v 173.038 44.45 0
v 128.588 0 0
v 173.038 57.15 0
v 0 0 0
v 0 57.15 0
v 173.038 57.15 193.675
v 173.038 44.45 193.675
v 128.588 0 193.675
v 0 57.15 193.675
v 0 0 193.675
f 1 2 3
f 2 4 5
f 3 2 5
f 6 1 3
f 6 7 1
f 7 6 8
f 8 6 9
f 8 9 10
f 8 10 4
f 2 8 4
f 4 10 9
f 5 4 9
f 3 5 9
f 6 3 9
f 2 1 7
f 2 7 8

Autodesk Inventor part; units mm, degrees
ref_plane "YZ Plane" through (0, 0, 0) normal (1, 0, 0) x (0, 1, 0)
ref_plane "XZ Plane" through (0, 0, 0) normal (0, 1, 0) x (-1, 0, 0)
ref_plane "XY Plane" through (0, 0, 0) normal (0, 0, 1) x (1, 0, 0)
sketch "Sketch1" plane through (0, 0, 0) normal (1, 0, 0) x (0, 1, 0)
  line L0 (0, 0) -> (57.15, 0)
  line L1 (57.15, 0) -> (57.15, 193.675)
  line L2 (57.15, 193.675) -> (0, 193.675)
  line L3 (0, 193.675) -> (0, 0)
  dimension "d0" = 57.15
  dimension "d1" = 193.675
extrude "Extrusion1" add sketch "Sketch1" along normal blind 173.0375
sketch "Sketch3" plane through (0, 0, 0) normal (0, 0, -1) x (-1, 0, 0)
  line L0 (-173.0375, 57.15) -> (-173.0375, 0) projected
  line L1 (-173.0375, 44.45) -> (-128.5875, 0)
  line L2 (-173.0375, 44.45) -> (-110.1757, 44.45) construction
  line L3 (-128.5875, 0) -> (-173.0375, 0)
  line L4 (-173.0375, 0) -> (-173.0375, 44.45)
  point P0 (0, 0)
  dimension "d9" = 45
  dimension "d10" = 12.7
  dimension "d11" = 44.45
extrude "Extrusion3" cut sketch "Sketch3" against normal up to surface (193.675 mm away)
properties part number "3-80" material "Granite, Cut, Polished"
